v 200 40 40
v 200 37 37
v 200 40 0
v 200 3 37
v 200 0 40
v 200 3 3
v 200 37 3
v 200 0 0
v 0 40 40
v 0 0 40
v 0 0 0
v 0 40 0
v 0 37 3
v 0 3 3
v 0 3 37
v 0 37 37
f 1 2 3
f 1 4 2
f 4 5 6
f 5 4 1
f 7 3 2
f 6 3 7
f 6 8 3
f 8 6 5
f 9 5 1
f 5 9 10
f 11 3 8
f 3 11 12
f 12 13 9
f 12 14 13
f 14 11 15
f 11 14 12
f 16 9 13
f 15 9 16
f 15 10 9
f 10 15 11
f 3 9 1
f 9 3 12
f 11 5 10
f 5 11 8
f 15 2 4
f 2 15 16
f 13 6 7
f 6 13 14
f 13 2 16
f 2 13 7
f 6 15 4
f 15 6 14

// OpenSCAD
$fn = 32;

// ----------------------------------------------------------------------
// Box beam: 200-250 mm hollow beam
// ----------------------------------------------------------------------

// --- parameters (mm) ---
beam_l = 200;             // beam length, X
beam_w = 40;              // beam width, Y
beam_h = 40;              // beam height, Z
wall = 3;                 // wall thickness

difference() {
  cube([beam_l, beam_w, beam_h]);
  translate([-1, wall, wall])
    cube([beam_l + 2, beam_w - 2 * wall, beam_h - 2 * wall]);
}
